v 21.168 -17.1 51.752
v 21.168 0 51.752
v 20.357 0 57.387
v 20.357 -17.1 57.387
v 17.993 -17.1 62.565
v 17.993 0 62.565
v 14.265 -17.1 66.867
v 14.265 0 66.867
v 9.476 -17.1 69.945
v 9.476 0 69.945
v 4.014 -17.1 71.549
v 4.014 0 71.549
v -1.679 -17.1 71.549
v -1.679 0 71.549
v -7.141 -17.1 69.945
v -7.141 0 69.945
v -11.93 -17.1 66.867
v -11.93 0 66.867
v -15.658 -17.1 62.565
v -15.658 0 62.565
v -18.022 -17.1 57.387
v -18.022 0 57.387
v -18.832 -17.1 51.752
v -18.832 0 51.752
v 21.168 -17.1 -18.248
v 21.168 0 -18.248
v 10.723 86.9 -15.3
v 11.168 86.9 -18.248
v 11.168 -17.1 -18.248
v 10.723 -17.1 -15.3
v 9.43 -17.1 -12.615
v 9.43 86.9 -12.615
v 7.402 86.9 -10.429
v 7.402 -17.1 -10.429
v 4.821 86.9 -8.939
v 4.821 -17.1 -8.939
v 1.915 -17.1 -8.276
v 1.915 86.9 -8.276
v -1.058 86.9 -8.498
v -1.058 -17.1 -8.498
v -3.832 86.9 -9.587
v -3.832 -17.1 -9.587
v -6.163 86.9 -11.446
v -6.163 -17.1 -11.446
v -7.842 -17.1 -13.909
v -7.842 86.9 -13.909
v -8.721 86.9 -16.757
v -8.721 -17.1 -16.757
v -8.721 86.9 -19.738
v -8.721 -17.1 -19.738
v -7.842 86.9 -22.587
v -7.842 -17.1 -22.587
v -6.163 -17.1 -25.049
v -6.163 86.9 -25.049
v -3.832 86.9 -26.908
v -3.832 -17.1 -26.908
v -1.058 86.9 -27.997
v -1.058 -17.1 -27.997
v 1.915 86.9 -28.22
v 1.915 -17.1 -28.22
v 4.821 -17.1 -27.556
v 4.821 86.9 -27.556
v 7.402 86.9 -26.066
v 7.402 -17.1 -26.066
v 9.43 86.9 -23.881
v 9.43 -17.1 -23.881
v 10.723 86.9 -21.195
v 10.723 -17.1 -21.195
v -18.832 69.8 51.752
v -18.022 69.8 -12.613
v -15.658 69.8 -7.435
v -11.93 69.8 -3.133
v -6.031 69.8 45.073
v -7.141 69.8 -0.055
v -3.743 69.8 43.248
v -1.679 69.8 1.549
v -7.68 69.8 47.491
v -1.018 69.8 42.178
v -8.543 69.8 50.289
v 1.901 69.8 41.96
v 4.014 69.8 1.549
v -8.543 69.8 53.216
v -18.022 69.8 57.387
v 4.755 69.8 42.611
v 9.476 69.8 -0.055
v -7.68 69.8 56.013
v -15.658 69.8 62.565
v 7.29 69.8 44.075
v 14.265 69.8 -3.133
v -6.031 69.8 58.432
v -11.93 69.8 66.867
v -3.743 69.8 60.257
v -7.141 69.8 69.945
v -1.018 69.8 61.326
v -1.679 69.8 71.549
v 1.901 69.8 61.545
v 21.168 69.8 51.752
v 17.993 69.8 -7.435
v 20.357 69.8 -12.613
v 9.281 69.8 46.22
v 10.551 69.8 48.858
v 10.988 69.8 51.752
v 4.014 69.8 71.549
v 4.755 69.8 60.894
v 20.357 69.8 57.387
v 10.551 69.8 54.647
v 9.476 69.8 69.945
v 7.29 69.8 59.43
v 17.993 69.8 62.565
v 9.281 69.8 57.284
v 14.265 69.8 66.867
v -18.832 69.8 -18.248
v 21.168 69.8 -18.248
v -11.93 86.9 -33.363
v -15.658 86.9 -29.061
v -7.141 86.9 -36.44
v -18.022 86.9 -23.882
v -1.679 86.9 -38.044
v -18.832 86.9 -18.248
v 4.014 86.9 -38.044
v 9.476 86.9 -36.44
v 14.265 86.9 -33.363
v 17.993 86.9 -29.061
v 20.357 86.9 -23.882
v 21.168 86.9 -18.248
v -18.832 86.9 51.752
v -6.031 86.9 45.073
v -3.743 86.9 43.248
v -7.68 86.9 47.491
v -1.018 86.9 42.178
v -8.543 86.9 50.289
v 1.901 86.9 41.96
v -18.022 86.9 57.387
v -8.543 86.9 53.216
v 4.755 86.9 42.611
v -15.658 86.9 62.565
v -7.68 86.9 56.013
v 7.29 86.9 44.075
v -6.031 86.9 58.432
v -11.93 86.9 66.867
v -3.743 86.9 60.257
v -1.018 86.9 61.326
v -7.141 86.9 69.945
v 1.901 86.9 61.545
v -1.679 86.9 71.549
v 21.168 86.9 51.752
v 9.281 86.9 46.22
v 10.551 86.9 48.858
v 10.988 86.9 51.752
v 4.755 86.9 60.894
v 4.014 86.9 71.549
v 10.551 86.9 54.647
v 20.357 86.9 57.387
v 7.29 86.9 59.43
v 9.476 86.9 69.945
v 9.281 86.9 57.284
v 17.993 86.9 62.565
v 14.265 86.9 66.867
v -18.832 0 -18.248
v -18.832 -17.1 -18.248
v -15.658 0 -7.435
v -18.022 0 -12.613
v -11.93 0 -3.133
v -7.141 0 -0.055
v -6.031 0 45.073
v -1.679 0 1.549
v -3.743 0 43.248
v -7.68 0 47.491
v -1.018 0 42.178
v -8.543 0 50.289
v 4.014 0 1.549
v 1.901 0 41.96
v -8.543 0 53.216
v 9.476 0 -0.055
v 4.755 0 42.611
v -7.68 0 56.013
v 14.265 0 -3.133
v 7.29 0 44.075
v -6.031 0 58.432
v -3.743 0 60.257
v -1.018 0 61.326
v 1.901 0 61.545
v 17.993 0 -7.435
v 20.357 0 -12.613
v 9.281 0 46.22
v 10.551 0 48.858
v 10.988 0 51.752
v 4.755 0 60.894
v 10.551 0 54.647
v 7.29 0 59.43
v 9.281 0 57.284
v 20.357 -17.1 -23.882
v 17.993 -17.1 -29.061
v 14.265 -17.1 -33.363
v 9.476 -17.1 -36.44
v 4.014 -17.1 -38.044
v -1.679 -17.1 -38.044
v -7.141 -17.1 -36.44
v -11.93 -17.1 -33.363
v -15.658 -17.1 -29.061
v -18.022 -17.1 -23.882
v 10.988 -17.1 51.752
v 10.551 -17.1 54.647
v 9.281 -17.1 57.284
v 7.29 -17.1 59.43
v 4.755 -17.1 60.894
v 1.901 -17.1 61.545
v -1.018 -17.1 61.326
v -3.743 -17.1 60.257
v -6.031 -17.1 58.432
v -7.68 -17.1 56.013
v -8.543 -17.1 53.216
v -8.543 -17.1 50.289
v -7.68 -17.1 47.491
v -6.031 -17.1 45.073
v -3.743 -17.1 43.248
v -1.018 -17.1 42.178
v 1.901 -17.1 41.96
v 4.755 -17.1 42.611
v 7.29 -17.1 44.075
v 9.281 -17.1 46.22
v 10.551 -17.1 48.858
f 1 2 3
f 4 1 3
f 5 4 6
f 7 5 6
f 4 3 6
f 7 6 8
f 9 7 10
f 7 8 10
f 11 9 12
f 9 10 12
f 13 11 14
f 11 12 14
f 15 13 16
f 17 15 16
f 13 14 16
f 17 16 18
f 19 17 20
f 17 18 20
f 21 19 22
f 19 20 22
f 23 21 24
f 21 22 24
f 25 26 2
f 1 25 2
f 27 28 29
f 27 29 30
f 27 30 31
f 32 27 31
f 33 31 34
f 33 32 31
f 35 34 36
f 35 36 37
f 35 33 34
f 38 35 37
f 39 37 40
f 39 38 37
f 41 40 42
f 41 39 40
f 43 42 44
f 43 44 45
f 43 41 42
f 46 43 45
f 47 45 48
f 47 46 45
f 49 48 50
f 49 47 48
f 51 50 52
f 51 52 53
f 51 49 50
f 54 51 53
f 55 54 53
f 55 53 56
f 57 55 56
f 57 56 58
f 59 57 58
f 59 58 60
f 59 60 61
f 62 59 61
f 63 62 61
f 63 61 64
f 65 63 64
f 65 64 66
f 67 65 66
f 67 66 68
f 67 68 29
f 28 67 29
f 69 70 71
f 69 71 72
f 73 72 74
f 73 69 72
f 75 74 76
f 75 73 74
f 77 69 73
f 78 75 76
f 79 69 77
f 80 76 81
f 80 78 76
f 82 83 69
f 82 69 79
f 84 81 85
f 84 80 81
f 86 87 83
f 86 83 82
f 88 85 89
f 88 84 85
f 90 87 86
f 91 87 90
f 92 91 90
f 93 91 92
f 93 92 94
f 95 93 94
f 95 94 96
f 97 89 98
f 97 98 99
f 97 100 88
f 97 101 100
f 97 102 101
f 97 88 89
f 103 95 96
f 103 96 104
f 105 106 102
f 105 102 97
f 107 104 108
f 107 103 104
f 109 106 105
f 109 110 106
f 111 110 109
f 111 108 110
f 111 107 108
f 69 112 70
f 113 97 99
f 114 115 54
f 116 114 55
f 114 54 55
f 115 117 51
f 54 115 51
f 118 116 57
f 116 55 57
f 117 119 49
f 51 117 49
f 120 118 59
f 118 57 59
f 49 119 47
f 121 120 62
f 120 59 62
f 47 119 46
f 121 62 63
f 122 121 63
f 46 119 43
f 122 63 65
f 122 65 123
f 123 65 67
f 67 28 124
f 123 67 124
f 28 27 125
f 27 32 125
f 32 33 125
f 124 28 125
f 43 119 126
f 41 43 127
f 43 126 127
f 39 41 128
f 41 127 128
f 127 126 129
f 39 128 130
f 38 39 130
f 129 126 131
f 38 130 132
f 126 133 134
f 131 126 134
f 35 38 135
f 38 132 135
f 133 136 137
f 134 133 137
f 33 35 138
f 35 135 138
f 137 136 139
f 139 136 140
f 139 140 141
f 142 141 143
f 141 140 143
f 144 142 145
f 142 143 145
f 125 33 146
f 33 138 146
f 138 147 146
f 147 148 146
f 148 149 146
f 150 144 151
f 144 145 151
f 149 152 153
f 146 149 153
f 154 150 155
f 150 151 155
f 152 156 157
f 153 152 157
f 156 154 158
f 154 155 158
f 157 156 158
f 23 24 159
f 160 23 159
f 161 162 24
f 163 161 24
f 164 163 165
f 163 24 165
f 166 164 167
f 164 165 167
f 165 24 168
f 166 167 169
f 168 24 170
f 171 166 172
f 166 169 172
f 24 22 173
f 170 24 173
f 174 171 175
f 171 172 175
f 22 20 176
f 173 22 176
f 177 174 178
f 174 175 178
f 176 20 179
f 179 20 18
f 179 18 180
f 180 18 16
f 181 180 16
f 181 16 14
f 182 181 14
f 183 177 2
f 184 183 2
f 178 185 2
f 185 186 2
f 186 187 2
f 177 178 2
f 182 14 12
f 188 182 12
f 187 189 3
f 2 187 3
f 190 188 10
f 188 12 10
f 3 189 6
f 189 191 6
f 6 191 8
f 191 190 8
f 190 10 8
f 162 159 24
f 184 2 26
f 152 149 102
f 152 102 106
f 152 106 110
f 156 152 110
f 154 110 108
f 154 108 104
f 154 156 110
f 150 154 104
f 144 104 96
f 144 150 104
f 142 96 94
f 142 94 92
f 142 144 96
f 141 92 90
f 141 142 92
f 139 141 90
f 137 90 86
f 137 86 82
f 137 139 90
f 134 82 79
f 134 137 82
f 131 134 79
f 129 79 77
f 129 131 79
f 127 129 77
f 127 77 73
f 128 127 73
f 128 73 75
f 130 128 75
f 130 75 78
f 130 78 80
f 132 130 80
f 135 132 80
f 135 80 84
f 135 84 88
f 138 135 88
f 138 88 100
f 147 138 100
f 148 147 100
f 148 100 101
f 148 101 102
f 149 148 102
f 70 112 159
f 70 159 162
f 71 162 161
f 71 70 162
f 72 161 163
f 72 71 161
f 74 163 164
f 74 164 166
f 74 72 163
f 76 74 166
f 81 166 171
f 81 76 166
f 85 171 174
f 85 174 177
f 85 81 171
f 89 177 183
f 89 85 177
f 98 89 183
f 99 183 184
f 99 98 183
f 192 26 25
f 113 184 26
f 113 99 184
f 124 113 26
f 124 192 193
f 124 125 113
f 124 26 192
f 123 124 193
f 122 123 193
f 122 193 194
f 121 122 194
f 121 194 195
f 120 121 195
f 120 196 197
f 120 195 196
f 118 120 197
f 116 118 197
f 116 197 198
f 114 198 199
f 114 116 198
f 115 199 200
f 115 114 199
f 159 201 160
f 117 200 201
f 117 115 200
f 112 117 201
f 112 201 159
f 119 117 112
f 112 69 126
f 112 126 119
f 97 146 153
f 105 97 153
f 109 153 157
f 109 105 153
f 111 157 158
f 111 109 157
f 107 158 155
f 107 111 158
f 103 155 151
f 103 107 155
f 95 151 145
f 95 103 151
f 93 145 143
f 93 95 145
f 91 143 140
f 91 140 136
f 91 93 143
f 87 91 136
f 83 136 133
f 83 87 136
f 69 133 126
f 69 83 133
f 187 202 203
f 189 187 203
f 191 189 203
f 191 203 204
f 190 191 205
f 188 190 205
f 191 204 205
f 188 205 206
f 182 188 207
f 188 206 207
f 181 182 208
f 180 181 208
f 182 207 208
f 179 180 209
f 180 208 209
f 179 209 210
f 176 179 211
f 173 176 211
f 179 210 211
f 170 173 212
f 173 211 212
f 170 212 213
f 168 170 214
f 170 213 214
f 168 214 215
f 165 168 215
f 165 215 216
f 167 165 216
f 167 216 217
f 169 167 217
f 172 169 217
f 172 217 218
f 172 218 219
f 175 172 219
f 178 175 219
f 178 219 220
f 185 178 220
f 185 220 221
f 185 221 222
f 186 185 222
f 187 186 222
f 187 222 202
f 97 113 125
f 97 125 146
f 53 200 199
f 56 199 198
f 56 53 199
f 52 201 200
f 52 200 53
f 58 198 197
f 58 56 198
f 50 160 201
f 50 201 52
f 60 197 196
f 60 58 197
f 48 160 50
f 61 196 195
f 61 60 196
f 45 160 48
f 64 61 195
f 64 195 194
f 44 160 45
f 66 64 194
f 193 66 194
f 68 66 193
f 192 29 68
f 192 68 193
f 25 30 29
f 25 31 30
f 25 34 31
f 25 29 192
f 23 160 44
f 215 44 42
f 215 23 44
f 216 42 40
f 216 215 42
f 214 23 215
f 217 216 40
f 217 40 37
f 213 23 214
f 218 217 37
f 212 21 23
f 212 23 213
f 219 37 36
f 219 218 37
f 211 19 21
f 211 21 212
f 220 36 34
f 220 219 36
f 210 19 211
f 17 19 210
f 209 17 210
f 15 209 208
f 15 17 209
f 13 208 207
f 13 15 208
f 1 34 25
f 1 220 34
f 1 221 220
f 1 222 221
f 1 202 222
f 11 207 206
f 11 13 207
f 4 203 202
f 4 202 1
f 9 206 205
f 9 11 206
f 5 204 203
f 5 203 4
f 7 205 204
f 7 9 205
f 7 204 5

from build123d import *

# Parameters (mm, degrees)
F1_DEPTH = 17.1
F2_R     = 9.8201820523
F3_DEPTH = 25
F5_DEPTH = 34.9
F6_R     = 10
F7_DEPTH = 52.001


with BuildPart() as f1:
    # F0 (on Front) → F1 (new body)
    with BuildSketch(Plane.XZ):
        with BuildLine():
            Line((-18.8324629198, 51.7522737756), (-18.8324629198, -18.2477262244))
            ThreePointArc((-18.8324629198, -18.2477262244), (1.1675370802, -38.2477262244), (21.1675370802, -18.2477262244))
            Line((21.1675370802, -18.2477262244), (21.1675370802, 51.7522737756))
            ThreePointArc((21.1675370802, 51.7522737756), (1.1675370802, 71.7522737756), (-18.8324629198, 51.7522737756))
        make_face()
    extrude(amount=F1_DEPTH)

    # F2 (on face) → F3 (cut)
    with BuildSketch(Plane.XZ.offset(17.1)):
        with Locations((1.1675370802, 51.7522737756)):
            Circle(F2_R)
    extrude(amount=-F3_DEPTH, mode=Mode.SUBTRACT)

    # F4 (on face) → F5 (join)
    with BuildSketch(Plane(origin=(0, 0, 0), x_dir=(-1, 0, 0), z_dir=(0, 1, 0))):
        with BuildLine():
            ThreePointArc((-21.1675370802, -18.2477262244), (-1.1675370802, -38.2477262244), (18.8324629198, -18.2477262244))
            ThreePointArc((18.8324629198, -18.2477262244), (-1.1675370802, 1.7522737756), (-21.1675370802, -18.2477262244))
        make_face()
    extrude(amount=F5_DEPTH)

    # F6 (on face) → F7 (cut, through all)
    with BuildSketch(Plane.XZ.offset(17.1)):
        with Locations((1.1675370802, -18.2477262244)):
            Circle(F6_R)
    extrude(amount=-F7_DEPTH, mode=Mode.SUBTRACT)

    # F8: F1 across face


with BuildPart() as f1_1:
    add(f1.part)
    add(f1.part.mirror(Plane(origin=(1.1675370802, 34.9, -18.2477262244), x_dir=(-1, 0, 0), z_dir=(0, 1, 0))))


solid = f1_1.part
